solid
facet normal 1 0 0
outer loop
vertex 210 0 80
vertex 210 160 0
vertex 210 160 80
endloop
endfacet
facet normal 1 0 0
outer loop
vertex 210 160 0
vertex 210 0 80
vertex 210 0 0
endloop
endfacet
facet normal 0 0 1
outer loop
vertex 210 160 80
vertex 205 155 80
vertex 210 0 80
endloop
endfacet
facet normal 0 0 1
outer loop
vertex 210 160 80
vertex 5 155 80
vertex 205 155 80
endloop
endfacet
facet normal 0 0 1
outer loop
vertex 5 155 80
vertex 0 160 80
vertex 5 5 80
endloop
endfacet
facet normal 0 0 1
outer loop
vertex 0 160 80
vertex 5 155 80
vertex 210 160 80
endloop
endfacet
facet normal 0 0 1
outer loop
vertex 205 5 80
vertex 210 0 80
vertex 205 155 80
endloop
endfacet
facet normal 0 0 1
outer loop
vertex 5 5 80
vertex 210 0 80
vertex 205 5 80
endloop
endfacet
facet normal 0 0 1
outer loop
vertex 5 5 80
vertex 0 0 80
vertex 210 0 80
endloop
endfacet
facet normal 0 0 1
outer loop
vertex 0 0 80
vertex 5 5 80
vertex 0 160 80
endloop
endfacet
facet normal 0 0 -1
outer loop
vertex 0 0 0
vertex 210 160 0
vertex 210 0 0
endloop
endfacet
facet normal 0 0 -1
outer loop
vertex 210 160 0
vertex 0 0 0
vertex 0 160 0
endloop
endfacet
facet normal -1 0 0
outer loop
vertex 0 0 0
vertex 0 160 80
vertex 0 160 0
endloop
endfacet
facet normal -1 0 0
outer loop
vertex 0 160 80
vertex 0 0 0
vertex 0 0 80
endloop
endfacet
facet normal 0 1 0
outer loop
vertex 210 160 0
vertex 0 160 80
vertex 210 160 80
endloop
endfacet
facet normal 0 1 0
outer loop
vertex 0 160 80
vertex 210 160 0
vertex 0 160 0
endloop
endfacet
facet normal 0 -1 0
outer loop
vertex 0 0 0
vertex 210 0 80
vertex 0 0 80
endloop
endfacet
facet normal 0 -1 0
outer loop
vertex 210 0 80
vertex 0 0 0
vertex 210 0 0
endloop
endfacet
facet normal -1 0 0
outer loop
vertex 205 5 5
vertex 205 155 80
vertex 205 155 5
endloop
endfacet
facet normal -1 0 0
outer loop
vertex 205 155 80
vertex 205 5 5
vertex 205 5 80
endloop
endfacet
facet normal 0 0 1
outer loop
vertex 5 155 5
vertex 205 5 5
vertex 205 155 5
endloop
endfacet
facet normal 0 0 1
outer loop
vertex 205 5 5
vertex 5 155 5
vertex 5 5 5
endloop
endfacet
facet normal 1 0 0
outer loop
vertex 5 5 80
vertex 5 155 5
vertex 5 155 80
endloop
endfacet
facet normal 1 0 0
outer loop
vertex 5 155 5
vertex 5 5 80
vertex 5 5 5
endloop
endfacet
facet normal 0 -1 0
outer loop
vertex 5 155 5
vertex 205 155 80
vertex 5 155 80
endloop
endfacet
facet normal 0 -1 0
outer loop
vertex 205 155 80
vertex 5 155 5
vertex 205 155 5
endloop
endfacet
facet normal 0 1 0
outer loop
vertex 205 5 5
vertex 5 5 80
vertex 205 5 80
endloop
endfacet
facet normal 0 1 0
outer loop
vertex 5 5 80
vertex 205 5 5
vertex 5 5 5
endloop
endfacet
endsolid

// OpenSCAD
// Inside length of the box
innerLength=200; // [10:10:400]
// Inside width of the box
innerWidth=150; // [10:10:200]
// Inside height of the box
innerHeight=80; // [30:10:200]
// Wall thickness
wallThickness=5; // [1,2,3,4,5]

Box(innerLength, innerWidth, innerHeight);

module Box(innerLength, innerWidth, innerHeight) {
    difference() {
        cube([innerLength + 2*wallThickness,
              innerWidth + 2*wallThickness,
              innerHeight]);
        translate([wallThickness, wallThickness, wallThickness]) cube([innerLength, innerWidth, innerHeight]);
    }
}
